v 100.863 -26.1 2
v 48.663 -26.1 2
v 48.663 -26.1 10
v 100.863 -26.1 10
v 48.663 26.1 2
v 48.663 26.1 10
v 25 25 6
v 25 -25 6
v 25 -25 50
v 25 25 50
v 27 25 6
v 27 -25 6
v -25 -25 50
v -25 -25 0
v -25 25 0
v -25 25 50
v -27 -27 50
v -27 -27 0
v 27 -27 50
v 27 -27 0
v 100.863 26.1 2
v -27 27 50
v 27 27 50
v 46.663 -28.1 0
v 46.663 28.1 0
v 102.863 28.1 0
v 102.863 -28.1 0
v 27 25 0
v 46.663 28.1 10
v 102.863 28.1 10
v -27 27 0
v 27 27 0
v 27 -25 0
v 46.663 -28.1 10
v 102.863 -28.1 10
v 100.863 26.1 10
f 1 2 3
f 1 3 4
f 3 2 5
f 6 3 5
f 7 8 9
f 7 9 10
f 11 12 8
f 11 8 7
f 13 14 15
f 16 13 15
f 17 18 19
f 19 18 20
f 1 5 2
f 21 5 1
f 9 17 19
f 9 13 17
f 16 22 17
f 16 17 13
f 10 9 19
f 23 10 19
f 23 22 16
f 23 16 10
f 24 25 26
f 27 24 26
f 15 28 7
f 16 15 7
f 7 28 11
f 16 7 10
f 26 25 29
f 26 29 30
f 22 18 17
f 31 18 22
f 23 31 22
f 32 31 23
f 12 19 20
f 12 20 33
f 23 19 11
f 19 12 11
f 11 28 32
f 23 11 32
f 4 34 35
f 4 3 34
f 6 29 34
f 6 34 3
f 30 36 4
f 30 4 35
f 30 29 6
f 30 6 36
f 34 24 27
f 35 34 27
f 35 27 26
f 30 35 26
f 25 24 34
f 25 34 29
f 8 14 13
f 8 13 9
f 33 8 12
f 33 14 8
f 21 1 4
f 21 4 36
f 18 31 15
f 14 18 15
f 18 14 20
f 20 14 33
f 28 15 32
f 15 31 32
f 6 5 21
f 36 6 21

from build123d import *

# Parameters (mm, degrees)
F0_W     = 54
F0_H     = 54
F0_W_2   = 50
F0_H_2   = 50
F1_DEPTH = 50
F3_W     = 50
F3_H     = 6
F4_DEPTH = 2
F0_W_3   = 56.2
F0_H_3   = 56.2
F0_W_4   = 52.2
F0_H_4   = 52.2
F5_DEPTH = 10
F6_DEPTH = 2


with BuildPart() as f1:
    # F0 (on Top) → F1 (new body)
    with BuildSketch(Plane.XY):
        Rectangle(F0_W, F0_H)
        Rectangle(F0_W_2, F0_H_2, mode=Mode.SUBTRACT)
    extrude(amount=F1_DEPTH)

    # F3 (on offset) → F4 (cut)
    with BuildSketch(Plane.YZ.offset(27)):
        with Locations((0, 3)):
            Rectangle(F3_W, F3_H)
    extrude(amount=-F4_DEPTH, mode=Mode.SUBTRACT)


with BuildPart() as f5:
    # F0 (on Top) → F5 (new body)
    with BuildSketch(Plane.XY):
        with Locations((74.762814, 0)):
            Rectangle(F0_W_3, F0_H_3)
        with Locations((74.762814, 0)):
            Rectangle(F0_W_4, F0_H_4, mode=Mode.SUBTRACT)
    extrude(amount=F5_DEPTH)

    # F0 (on Top) → F6 (join)
    with BuildSketch(Plane.XY):
        with Locations((74.762814, 0)):
            Rectangle(F0_W_4, F0_H_4)
    extrude(amount=F6_DEPTH)


solid = Compound([f1.part, f5.part])
